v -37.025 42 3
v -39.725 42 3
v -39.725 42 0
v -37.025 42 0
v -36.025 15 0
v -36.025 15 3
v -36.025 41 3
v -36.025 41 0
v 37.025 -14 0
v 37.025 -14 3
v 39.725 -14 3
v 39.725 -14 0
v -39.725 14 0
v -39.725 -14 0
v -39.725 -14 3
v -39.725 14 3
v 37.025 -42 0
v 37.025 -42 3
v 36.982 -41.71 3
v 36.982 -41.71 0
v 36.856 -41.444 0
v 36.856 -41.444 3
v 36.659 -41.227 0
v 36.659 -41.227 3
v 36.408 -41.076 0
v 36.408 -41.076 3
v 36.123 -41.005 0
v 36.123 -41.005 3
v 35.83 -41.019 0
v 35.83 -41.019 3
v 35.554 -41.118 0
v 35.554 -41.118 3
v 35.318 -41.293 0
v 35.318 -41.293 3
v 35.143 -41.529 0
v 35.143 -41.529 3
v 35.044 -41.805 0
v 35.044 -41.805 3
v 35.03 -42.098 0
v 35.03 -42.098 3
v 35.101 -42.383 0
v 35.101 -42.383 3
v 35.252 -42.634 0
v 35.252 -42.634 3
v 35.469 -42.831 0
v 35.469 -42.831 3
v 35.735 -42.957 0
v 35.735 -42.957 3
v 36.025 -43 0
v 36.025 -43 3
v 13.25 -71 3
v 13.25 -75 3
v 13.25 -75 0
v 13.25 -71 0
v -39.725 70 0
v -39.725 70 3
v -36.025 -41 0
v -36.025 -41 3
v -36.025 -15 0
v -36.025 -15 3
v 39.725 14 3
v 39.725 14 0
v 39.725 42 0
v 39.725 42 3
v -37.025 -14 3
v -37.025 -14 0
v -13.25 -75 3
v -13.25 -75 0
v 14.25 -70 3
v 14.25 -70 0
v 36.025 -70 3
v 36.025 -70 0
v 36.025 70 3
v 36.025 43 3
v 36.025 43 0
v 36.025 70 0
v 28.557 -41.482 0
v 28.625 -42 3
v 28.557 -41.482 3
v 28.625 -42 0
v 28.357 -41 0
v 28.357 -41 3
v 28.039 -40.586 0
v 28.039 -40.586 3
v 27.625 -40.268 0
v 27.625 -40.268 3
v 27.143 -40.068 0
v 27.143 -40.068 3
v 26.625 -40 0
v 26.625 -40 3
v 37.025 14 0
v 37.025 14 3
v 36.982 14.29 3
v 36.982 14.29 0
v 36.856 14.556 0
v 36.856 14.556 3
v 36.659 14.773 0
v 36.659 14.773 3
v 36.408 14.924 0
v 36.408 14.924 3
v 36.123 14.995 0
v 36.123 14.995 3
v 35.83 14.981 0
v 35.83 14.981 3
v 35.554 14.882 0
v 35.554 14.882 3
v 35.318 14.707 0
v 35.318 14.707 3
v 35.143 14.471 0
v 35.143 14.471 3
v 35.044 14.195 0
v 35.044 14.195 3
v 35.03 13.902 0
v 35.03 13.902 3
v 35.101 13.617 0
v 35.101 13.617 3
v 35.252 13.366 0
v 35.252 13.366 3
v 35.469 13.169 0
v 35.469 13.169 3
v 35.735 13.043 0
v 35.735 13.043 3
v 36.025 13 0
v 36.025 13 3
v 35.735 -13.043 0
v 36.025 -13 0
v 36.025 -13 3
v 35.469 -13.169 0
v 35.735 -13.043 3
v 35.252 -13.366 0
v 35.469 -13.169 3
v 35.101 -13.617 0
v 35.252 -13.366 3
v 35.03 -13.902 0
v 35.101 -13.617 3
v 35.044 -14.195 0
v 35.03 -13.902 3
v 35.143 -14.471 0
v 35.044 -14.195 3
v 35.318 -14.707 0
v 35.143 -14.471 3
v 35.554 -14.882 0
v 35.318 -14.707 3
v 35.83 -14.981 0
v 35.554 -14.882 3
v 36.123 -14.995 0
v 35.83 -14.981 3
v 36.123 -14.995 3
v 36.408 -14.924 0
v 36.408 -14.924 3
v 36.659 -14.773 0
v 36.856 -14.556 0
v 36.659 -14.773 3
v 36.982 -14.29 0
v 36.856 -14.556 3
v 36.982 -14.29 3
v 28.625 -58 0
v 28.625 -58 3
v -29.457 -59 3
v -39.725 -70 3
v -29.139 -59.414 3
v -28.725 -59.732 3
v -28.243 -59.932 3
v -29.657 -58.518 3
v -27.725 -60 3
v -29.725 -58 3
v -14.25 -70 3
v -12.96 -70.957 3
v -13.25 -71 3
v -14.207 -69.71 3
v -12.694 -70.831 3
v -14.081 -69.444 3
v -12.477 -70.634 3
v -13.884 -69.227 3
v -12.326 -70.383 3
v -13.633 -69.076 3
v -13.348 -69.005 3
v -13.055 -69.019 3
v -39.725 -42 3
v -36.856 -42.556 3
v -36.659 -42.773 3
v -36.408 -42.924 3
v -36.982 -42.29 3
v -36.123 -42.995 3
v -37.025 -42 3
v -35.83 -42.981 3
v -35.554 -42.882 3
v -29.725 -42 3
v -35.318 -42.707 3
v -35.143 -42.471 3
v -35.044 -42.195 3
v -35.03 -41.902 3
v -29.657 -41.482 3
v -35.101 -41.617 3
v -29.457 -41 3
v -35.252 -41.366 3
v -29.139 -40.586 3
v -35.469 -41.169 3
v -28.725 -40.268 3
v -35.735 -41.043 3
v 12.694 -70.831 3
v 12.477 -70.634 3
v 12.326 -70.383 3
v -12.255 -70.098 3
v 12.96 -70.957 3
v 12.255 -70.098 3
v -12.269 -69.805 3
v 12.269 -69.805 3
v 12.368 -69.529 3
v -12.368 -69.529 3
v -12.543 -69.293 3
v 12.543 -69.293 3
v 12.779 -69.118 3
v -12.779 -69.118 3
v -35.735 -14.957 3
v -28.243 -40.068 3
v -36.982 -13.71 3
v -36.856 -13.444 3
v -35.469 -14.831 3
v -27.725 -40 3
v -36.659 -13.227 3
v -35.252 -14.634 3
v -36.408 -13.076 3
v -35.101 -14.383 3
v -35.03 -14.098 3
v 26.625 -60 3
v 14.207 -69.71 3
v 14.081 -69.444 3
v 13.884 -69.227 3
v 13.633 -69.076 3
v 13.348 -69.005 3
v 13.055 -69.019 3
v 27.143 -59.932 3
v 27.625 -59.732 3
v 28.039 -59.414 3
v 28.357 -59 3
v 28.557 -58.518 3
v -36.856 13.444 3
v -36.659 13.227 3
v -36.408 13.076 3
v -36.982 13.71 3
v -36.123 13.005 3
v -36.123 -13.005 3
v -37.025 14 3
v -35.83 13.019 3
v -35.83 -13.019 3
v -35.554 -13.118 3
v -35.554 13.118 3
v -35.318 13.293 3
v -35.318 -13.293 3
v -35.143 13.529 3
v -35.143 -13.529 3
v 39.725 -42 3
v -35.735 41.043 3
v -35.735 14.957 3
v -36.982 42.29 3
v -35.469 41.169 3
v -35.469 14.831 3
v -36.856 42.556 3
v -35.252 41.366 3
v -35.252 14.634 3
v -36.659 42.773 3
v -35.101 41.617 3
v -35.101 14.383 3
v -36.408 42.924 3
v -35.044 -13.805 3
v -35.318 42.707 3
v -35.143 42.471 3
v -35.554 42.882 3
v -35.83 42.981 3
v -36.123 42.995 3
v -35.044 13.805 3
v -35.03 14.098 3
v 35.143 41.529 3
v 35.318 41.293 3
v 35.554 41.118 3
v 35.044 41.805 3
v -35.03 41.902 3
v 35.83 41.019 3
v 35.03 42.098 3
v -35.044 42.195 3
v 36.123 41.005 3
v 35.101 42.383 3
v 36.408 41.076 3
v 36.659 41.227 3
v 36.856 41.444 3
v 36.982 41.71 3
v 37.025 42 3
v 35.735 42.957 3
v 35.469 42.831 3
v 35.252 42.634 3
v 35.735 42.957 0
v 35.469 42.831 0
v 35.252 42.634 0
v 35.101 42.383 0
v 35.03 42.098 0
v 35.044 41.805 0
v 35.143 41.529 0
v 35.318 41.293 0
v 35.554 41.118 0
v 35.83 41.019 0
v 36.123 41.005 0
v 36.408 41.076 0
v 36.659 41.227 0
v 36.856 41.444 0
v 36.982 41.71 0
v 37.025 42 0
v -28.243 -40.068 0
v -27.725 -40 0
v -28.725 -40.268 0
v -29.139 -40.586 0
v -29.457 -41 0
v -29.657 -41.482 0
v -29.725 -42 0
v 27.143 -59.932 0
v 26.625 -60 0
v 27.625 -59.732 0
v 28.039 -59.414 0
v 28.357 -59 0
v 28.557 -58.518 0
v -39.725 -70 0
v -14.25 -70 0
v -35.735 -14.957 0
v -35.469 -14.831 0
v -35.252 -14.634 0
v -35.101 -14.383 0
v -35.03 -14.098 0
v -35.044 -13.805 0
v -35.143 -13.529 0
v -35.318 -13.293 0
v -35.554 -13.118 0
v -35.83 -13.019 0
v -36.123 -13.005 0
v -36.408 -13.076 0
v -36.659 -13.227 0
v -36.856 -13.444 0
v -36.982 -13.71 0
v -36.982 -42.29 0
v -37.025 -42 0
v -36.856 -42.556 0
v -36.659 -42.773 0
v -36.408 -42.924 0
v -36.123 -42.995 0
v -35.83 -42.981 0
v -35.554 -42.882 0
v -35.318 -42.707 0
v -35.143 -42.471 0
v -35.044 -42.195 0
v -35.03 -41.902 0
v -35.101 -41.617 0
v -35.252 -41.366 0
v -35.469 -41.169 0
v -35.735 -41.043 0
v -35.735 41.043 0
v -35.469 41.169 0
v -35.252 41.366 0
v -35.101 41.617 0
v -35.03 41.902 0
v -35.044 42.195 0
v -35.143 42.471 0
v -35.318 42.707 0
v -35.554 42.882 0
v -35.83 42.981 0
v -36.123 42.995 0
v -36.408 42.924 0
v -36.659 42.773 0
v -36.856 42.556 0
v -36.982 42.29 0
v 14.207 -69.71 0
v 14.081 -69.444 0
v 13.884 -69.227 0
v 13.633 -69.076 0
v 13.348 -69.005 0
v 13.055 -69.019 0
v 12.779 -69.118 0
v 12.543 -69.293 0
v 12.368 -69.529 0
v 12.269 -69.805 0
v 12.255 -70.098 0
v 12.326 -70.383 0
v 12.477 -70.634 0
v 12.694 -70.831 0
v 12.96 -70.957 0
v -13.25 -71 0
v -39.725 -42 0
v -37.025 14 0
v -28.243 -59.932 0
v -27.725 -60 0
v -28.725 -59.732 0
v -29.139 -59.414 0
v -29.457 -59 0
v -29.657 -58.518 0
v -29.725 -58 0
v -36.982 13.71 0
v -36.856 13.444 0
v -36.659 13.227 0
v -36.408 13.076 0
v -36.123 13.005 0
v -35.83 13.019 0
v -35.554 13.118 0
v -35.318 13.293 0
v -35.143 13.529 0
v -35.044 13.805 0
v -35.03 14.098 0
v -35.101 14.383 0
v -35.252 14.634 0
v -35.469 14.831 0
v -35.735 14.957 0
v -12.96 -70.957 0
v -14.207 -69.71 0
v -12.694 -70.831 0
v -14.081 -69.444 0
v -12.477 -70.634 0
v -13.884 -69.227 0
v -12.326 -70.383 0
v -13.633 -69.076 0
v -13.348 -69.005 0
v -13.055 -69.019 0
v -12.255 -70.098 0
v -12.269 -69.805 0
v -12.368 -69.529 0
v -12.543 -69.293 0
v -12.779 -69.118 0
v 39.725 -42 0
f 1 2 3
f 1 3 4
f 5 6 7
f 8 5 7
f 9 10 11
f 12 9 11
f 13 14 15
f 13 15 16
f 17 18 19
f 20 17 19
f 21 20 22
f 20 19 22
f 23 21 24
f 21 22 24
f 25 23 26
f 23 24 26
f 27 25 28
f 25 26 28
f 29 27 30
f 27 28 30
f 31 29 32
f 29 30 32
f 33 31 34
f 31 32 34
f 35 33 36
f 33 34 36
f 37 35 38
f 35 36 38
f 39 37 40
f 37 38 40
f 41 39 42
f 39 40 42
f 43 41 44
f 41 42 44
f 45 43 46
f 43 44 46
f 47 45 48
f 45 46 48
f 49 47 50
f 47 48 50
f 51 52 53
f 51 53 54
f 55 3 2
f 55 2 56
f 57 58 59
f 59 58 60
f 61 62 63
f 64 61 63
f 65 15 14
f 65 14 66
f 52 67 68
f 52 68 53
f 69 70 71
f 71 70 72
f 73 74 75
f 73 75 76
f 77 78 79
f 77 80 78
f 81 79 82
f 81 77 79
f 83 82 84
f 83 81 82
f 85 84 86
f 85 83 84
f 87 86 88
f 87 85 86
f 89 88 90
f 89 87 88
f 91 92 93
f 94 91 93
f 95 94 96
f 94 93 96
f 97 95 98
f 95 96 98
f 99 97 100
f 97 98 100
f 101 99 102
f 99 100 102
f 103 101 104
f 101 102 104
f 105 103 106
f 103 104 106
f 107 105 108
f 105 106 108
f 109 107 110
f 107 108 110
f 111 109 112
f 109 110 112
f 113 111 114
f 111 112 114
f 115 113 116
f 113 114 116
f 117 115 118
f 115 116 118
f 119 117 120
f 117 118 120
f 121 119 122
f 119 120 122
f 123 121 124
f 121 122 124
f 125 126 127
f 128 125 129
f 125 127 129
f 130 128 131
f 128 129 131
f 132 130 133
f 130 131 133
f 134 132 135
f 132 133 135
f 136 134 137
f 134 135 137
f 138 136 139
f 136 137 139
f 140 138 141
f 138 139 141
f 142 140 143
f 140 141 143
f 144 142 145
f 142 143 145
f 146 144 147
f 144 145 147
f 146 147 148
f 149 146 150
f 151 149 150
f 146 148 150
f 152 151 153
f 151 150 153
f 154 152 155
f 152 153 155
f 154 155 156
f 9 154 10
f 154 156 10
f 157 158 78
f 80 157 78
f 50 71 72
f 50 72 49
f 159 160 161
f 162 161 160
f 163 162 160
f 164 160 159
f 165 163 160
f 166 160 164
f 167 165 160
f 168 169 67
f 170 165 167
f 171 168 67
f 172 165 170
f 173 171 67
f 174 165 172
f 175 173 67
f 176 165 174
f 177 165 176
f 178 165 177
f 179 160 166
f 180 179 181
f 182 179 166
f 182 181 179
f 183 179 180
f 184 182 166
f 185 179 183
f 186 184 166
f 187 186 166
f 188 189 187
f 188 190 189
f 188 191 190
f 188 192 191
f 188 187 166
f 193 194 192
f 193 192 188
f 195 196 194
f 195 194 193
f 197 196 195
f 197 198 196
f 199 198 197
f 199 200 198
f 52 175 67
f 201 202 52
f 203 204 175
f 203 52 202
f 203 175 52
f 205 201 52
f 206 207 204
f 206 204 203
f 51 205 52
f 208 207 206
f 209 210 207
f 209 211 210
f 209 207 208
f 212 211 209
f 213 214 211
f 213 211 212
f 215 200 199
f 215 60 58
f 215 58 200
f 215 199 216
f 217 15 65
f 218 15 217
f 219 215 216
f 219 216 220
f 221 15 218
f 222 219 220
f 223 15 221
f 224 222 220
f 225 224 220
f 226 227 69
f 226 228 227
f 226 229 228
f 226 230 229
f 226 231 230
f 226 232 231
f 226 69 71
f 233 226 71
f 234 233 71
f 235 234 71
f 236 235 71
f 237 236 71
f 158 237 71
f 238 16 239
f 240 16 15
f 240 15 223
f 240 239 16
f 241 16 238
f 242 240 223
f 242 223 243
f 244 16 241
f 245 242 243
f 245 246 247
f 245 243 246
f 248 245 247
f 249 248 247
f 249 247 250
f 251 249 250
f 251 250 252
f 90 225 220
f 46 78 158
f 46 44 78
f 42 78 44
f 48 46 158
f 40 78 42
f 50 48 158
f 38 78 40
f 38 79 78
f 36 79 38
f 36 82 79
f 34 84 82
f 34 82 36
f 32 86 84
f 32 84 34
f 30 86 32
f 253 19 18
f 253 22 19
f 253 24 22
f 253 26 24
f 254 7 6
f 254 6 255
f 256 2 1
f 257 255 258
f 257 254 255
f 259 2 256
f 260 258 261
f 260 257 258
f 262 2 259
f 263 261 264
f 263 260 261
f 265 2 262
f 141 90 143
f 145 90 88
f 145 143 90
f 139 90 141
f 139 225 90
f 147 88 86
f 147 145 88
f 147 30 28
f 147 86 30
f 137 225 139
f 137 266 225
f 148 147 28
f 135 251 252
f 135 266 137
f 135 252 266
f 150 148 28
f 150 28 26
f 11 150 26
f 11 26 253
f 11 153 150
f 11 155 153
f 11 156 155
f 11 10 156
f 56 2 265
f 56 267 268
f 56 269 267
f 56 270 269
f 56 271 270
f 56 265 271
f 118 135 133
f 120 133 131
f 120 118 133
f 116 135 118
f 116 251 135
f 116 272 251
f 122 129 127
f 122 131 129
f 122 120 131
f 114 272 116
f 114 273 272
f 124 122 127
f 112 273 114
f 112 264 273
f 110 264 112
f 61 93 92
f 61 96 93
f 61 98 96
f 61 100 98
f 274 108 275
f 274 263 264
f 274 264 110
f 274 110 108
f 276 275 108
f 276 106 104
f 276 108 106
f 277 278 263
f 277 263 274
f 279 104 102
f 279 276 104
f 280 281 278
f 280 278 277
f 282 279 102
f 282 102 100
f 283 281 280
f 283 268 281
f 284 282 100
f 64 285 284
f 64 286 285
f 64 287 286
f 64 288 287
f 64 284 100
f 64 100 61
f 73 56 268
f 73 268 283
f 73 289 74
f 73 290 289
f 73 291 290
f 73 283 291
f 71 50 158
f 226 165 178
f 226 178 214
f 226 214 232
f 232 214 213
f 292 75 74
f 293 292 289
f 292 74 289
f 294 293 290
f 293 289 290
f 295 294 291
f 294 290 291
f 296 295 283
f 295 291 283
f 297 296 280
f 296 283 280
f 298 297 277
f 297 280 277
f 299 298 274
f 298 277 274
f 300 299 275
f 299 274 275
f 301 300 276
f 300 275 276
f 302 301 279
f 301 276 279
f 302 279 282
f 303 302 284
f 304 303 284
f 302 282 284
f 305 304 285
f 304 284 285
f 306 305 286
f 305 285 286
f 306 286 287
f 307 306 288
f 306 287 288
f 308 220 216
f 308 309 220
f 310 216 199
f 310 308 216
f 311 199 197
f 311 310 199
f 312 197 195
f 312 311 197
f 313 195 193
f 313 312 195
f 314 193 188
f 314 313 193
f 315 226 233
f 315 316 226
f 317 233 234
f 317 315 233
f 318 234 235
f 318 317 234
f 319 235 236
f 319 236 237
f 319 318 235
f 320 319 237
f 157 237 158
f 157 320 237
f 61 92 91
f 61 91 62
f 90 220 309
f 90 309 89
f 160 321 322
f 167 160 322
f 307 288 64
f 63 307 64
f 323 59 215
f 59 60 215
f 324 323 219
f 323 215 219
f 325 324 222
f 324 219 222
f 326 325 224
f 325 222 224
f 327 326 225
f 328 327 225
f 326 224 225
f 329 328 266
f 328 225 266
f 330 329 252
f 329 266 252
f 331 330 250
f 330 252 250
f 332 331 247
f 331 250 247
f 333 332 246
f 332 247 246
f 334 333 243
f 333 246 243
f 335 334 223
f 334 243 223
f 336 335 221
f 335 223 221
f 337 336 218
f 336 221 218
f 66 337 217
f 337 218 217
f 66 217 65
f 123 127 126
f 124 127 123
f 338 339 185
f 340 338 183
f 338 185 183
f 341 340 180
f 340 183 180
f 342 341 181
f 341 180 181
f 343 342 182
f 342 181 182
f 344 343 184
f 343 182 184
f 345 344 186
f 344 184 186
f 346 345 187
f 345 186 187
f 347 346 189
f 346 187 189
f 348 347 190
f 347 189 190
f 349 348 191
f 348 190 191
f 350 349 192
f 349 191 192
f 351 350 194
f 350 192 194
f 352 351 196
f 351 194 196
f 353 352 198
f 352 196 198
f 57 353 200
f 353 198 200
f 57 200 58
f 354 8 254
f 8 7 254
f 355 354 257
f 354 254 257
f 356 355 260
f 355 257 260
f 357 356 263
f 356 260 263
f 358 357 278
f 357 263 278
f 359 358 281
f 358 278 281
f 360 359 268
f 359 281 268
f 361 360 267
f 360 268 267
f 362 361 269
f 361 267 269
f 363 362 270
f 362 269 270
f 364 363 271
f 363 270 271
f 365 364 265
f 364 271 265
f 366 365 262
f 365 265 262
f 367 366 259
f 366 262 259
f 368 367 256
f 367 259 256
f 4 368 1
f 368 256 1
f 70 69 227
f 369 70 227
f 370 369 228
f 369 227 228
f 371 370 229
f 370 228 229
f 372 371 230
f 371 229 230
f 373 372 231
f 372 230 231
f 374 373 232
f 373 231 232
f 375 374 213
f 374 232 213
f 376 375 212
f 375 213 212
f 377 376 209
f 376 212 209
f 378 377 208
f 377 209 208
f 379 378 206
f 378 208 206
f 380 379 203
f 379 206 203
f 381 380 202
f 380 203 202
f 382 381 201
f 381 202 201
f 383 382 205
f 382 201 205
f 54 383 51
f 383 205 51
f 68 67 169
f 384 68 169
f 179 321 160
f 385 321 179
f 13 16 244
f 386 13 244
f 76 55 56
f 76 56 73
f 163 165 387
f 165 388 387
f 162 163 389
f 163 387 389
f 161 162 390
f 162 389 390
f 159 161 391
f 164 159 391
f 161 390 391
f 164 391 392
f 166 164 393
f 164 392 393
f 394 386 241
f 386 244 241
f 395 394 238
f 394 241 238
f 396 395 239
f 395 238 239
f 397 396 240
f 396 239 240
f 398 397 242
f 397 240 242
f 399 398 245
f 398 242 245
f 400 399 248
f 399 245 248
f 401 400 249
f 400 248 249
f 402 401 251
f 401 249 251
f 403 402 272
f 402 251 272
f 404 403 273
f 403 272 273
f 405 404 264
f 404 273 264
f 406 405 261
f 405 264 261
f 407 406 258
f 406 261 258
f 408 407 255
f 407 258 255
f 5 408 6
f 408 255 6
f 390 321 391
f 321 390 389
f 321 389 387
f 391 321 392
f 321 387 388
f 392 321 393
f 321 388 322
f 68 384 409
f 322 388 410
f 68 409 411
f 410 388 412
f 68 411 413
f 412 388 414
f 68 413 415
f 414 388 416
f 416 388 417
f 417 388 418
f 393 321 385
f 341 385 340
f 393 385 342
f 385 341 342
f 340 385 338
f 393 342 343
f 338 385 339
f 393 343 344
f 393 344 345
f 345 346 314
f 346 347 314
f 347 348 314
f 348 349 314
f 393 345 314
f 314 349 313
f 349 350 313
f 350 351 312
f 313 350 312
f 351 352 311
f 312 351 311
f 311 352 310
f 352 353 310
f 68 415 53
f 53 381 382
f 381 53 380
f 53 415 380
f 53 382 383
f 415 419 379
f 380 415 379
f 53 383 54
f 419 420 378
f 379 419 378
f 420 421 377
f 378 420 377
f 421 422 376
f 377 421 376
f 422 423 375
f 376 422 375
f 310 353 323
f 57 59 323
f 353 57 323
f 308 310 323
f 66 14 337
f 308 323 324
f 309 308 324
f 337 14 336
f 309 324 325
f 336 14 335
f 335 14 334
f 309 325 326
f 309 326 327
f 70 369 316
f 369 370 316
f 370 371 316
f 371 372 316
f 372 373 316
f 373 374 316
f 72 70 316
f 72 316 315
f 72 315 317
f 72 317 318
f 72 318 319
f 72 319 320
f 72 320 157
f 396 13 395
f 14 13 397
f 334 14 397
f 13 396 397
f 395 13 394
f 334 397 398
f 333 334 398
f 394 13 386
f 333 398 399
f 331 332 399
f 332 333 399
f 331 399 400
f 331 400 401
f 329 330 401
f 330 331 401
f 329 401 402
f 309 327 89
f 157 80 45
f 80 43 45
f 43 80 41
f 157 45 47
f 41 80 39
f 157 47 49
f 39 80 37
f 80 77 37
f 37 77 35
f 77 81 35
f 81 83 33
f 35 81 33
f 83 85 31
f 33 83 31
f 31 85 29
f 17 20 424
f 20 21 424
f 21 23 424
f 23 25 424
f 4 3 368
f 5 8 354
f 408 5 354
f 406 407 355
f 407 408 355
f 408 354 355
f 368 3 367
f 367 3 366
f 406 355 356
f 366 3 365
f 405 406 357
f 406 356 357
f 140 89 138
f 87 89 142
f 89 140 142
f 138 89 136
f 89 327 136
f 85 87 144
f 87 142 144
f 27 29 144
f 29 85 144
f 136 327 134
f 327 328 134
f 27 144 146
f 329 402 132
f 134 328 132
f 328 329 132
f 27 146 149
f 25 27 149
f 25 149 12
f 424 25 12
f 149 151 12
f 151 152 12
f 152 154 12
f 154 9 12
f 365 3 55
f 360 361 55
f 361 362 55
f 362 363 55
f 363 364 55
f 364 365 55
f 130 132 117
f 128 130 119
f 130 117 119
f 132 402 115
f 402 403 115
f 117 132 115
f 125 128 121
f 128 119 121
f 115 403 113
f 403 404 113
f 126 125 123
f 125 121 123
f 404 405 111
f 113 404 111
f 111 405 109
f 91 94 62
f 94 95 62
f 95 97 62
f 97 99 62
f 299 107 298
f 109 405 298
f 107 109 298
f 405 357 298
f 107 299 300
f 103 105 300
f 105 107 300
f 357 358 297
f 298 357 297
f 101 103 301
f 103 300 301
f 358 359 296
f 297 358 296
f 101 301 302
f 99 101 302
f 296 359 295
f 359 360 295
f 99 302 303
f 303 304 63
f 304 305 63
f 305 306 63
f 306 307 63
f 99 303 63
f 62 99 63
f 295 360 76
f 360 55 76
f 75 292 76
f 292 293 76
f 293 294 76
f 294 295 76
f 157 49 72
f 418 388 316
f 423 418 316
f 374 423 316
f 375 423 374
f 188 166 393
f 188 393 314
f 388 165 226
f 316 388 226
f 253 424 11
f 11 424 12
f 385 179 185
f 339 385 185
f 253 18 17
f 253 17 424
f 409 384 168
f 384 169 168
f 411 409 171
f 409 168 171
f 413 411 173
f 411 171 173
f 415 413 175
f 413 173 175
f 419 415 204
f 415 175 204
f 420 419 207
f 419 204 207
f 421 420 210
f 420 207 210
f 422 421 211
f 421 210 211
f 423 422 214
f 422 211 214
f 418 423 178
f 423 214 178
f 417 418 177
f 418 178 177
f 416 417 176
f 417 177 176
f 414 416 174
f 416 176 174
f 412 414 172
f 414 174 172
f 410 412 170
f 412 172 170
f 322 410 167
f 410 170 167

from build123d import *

# Parameters (mm, degrees)
SKETCH1_W           = 79.45
SKETCH1_H           = 140
BOSS_EXTRUDE1_DEPTH = 3
SKETCH2_W           = 58.35
SKETCH2_H           = 20
CUT_EXTRUDE1_DEPTH  = 81.542384029
FILLET1_R           = 2
SKETCH3_W           = 3.7
SKETCH3_H           = 28
CUT_EXTRUDE2_DEPTH  = 81.542384029
SKETCH5_W           = 26.5
SKETCH5_H           = 5
BOSS_EXTRUDE2_DEPTH = 3
SKETCH6_R           = 1
CUT_EXTRUDE3_DEPTH  = 85.923940235


with BuildPart() as part:
    # Sketch1 → Boss-Extrude1 (new body)
    with BuildSketch(Plane.XY):
        Rectangle(SKETCH1_W, SKETCH1_H)
    extrude(amount=BOSS_EXTRUDE1_DEPTH)

    # Sketch2 → Cut-Extrude1 (cut, through all)
    with BuildSketch(Plane.XY.offset(3)):
        with Locations((-0.55, -50)):
            Rectangle(SKETCH2_W, SKETCH2_H)
    extrude(amount=-CUT_EXTRUDE1_DEPTH, mode=Mode.SUBTRACT)

    # Fillet1
    fillet1_edges = [part.edges().sort_by_distance(p)[0] for p in [
        (28.625, -40, 1.5),
        (28.625, -60, 1.5),
        (-29.725, -60, 1.5),
        (-29.725, -40, 1.5),
    ]]
    fillet(fillet1_edges, radius=FILLET1_R)

    # Sketch3 → Cut-Extrude2 (cut, through all)
    with BuildSketch(Plane.XY.offset(3)):
        with Locations((-37.875, 28)):
            Rectangle(SKETCH3_W, SKETCH3_H)
        with Locations((-37.875, -28)):
            Rectangle(SKETCH3_W, SKETCH3_H)
        with Locations((37.875, 56)):
            Rectangle(SKETCH3_W, SKETCH3_H)
        with Locations((37.875, 0)):
            Rectangle(SKETCH3_W, SKETCH3_H)
        with Locations((37.875, -56)):
            Rectangle(SKETCH3_W, SKETCH3_H)
    extrude(amount=-CUT_EXTRUDE2_DEPTH, mode=Mode.SUBTRACT)

    # Sketch5 → Boss-Extrude2 (add)
    with BuildSketch(Plane.XY.offset(3)):
        with Locations((0, -72.5)):
            Rectangle(SKETCH5_W, SKETCH5_H)
    extrude(amount=-BOSS_EXTRUDE2_DEPTH)

    # Sketch6 → Cut-Extrude3 (cut, through all)
    with BuildSketch(Plane.XY.offset(3)):
        with Locations((-36.025, 42)):
            Circle(SKETCH6_R)
        with Locations((-36.025, 14)):
            Circle(SKETCH6_R)
        with Locations((-36.025, -14)):
            Circle(SKETCH6_R)
        with Locations((-36.025, -42)):
            Circle(SKETCH6_R)
        with Locations((-13.25, -70)):
            Circle(SKETCH6_R)
        with Locations((13.25, -70)):
            Circle(SKETCH6_R)
        with Locations((36.025, -42)):
            Circle(SKETCH6_R)
        with Locations((36.025, -14)):
            Circle(SKETCH6_R)
        with Locations((36.025, 14)):
            Circle(SKETCH6_R)
        with Locations((36.025, 42)):
            Circle(SKETCH6_R)
    extrude(amount=-CUT_EXTRUDE3_DEPTH, mode=Mode.SUBTRACT)


solid = part.part
